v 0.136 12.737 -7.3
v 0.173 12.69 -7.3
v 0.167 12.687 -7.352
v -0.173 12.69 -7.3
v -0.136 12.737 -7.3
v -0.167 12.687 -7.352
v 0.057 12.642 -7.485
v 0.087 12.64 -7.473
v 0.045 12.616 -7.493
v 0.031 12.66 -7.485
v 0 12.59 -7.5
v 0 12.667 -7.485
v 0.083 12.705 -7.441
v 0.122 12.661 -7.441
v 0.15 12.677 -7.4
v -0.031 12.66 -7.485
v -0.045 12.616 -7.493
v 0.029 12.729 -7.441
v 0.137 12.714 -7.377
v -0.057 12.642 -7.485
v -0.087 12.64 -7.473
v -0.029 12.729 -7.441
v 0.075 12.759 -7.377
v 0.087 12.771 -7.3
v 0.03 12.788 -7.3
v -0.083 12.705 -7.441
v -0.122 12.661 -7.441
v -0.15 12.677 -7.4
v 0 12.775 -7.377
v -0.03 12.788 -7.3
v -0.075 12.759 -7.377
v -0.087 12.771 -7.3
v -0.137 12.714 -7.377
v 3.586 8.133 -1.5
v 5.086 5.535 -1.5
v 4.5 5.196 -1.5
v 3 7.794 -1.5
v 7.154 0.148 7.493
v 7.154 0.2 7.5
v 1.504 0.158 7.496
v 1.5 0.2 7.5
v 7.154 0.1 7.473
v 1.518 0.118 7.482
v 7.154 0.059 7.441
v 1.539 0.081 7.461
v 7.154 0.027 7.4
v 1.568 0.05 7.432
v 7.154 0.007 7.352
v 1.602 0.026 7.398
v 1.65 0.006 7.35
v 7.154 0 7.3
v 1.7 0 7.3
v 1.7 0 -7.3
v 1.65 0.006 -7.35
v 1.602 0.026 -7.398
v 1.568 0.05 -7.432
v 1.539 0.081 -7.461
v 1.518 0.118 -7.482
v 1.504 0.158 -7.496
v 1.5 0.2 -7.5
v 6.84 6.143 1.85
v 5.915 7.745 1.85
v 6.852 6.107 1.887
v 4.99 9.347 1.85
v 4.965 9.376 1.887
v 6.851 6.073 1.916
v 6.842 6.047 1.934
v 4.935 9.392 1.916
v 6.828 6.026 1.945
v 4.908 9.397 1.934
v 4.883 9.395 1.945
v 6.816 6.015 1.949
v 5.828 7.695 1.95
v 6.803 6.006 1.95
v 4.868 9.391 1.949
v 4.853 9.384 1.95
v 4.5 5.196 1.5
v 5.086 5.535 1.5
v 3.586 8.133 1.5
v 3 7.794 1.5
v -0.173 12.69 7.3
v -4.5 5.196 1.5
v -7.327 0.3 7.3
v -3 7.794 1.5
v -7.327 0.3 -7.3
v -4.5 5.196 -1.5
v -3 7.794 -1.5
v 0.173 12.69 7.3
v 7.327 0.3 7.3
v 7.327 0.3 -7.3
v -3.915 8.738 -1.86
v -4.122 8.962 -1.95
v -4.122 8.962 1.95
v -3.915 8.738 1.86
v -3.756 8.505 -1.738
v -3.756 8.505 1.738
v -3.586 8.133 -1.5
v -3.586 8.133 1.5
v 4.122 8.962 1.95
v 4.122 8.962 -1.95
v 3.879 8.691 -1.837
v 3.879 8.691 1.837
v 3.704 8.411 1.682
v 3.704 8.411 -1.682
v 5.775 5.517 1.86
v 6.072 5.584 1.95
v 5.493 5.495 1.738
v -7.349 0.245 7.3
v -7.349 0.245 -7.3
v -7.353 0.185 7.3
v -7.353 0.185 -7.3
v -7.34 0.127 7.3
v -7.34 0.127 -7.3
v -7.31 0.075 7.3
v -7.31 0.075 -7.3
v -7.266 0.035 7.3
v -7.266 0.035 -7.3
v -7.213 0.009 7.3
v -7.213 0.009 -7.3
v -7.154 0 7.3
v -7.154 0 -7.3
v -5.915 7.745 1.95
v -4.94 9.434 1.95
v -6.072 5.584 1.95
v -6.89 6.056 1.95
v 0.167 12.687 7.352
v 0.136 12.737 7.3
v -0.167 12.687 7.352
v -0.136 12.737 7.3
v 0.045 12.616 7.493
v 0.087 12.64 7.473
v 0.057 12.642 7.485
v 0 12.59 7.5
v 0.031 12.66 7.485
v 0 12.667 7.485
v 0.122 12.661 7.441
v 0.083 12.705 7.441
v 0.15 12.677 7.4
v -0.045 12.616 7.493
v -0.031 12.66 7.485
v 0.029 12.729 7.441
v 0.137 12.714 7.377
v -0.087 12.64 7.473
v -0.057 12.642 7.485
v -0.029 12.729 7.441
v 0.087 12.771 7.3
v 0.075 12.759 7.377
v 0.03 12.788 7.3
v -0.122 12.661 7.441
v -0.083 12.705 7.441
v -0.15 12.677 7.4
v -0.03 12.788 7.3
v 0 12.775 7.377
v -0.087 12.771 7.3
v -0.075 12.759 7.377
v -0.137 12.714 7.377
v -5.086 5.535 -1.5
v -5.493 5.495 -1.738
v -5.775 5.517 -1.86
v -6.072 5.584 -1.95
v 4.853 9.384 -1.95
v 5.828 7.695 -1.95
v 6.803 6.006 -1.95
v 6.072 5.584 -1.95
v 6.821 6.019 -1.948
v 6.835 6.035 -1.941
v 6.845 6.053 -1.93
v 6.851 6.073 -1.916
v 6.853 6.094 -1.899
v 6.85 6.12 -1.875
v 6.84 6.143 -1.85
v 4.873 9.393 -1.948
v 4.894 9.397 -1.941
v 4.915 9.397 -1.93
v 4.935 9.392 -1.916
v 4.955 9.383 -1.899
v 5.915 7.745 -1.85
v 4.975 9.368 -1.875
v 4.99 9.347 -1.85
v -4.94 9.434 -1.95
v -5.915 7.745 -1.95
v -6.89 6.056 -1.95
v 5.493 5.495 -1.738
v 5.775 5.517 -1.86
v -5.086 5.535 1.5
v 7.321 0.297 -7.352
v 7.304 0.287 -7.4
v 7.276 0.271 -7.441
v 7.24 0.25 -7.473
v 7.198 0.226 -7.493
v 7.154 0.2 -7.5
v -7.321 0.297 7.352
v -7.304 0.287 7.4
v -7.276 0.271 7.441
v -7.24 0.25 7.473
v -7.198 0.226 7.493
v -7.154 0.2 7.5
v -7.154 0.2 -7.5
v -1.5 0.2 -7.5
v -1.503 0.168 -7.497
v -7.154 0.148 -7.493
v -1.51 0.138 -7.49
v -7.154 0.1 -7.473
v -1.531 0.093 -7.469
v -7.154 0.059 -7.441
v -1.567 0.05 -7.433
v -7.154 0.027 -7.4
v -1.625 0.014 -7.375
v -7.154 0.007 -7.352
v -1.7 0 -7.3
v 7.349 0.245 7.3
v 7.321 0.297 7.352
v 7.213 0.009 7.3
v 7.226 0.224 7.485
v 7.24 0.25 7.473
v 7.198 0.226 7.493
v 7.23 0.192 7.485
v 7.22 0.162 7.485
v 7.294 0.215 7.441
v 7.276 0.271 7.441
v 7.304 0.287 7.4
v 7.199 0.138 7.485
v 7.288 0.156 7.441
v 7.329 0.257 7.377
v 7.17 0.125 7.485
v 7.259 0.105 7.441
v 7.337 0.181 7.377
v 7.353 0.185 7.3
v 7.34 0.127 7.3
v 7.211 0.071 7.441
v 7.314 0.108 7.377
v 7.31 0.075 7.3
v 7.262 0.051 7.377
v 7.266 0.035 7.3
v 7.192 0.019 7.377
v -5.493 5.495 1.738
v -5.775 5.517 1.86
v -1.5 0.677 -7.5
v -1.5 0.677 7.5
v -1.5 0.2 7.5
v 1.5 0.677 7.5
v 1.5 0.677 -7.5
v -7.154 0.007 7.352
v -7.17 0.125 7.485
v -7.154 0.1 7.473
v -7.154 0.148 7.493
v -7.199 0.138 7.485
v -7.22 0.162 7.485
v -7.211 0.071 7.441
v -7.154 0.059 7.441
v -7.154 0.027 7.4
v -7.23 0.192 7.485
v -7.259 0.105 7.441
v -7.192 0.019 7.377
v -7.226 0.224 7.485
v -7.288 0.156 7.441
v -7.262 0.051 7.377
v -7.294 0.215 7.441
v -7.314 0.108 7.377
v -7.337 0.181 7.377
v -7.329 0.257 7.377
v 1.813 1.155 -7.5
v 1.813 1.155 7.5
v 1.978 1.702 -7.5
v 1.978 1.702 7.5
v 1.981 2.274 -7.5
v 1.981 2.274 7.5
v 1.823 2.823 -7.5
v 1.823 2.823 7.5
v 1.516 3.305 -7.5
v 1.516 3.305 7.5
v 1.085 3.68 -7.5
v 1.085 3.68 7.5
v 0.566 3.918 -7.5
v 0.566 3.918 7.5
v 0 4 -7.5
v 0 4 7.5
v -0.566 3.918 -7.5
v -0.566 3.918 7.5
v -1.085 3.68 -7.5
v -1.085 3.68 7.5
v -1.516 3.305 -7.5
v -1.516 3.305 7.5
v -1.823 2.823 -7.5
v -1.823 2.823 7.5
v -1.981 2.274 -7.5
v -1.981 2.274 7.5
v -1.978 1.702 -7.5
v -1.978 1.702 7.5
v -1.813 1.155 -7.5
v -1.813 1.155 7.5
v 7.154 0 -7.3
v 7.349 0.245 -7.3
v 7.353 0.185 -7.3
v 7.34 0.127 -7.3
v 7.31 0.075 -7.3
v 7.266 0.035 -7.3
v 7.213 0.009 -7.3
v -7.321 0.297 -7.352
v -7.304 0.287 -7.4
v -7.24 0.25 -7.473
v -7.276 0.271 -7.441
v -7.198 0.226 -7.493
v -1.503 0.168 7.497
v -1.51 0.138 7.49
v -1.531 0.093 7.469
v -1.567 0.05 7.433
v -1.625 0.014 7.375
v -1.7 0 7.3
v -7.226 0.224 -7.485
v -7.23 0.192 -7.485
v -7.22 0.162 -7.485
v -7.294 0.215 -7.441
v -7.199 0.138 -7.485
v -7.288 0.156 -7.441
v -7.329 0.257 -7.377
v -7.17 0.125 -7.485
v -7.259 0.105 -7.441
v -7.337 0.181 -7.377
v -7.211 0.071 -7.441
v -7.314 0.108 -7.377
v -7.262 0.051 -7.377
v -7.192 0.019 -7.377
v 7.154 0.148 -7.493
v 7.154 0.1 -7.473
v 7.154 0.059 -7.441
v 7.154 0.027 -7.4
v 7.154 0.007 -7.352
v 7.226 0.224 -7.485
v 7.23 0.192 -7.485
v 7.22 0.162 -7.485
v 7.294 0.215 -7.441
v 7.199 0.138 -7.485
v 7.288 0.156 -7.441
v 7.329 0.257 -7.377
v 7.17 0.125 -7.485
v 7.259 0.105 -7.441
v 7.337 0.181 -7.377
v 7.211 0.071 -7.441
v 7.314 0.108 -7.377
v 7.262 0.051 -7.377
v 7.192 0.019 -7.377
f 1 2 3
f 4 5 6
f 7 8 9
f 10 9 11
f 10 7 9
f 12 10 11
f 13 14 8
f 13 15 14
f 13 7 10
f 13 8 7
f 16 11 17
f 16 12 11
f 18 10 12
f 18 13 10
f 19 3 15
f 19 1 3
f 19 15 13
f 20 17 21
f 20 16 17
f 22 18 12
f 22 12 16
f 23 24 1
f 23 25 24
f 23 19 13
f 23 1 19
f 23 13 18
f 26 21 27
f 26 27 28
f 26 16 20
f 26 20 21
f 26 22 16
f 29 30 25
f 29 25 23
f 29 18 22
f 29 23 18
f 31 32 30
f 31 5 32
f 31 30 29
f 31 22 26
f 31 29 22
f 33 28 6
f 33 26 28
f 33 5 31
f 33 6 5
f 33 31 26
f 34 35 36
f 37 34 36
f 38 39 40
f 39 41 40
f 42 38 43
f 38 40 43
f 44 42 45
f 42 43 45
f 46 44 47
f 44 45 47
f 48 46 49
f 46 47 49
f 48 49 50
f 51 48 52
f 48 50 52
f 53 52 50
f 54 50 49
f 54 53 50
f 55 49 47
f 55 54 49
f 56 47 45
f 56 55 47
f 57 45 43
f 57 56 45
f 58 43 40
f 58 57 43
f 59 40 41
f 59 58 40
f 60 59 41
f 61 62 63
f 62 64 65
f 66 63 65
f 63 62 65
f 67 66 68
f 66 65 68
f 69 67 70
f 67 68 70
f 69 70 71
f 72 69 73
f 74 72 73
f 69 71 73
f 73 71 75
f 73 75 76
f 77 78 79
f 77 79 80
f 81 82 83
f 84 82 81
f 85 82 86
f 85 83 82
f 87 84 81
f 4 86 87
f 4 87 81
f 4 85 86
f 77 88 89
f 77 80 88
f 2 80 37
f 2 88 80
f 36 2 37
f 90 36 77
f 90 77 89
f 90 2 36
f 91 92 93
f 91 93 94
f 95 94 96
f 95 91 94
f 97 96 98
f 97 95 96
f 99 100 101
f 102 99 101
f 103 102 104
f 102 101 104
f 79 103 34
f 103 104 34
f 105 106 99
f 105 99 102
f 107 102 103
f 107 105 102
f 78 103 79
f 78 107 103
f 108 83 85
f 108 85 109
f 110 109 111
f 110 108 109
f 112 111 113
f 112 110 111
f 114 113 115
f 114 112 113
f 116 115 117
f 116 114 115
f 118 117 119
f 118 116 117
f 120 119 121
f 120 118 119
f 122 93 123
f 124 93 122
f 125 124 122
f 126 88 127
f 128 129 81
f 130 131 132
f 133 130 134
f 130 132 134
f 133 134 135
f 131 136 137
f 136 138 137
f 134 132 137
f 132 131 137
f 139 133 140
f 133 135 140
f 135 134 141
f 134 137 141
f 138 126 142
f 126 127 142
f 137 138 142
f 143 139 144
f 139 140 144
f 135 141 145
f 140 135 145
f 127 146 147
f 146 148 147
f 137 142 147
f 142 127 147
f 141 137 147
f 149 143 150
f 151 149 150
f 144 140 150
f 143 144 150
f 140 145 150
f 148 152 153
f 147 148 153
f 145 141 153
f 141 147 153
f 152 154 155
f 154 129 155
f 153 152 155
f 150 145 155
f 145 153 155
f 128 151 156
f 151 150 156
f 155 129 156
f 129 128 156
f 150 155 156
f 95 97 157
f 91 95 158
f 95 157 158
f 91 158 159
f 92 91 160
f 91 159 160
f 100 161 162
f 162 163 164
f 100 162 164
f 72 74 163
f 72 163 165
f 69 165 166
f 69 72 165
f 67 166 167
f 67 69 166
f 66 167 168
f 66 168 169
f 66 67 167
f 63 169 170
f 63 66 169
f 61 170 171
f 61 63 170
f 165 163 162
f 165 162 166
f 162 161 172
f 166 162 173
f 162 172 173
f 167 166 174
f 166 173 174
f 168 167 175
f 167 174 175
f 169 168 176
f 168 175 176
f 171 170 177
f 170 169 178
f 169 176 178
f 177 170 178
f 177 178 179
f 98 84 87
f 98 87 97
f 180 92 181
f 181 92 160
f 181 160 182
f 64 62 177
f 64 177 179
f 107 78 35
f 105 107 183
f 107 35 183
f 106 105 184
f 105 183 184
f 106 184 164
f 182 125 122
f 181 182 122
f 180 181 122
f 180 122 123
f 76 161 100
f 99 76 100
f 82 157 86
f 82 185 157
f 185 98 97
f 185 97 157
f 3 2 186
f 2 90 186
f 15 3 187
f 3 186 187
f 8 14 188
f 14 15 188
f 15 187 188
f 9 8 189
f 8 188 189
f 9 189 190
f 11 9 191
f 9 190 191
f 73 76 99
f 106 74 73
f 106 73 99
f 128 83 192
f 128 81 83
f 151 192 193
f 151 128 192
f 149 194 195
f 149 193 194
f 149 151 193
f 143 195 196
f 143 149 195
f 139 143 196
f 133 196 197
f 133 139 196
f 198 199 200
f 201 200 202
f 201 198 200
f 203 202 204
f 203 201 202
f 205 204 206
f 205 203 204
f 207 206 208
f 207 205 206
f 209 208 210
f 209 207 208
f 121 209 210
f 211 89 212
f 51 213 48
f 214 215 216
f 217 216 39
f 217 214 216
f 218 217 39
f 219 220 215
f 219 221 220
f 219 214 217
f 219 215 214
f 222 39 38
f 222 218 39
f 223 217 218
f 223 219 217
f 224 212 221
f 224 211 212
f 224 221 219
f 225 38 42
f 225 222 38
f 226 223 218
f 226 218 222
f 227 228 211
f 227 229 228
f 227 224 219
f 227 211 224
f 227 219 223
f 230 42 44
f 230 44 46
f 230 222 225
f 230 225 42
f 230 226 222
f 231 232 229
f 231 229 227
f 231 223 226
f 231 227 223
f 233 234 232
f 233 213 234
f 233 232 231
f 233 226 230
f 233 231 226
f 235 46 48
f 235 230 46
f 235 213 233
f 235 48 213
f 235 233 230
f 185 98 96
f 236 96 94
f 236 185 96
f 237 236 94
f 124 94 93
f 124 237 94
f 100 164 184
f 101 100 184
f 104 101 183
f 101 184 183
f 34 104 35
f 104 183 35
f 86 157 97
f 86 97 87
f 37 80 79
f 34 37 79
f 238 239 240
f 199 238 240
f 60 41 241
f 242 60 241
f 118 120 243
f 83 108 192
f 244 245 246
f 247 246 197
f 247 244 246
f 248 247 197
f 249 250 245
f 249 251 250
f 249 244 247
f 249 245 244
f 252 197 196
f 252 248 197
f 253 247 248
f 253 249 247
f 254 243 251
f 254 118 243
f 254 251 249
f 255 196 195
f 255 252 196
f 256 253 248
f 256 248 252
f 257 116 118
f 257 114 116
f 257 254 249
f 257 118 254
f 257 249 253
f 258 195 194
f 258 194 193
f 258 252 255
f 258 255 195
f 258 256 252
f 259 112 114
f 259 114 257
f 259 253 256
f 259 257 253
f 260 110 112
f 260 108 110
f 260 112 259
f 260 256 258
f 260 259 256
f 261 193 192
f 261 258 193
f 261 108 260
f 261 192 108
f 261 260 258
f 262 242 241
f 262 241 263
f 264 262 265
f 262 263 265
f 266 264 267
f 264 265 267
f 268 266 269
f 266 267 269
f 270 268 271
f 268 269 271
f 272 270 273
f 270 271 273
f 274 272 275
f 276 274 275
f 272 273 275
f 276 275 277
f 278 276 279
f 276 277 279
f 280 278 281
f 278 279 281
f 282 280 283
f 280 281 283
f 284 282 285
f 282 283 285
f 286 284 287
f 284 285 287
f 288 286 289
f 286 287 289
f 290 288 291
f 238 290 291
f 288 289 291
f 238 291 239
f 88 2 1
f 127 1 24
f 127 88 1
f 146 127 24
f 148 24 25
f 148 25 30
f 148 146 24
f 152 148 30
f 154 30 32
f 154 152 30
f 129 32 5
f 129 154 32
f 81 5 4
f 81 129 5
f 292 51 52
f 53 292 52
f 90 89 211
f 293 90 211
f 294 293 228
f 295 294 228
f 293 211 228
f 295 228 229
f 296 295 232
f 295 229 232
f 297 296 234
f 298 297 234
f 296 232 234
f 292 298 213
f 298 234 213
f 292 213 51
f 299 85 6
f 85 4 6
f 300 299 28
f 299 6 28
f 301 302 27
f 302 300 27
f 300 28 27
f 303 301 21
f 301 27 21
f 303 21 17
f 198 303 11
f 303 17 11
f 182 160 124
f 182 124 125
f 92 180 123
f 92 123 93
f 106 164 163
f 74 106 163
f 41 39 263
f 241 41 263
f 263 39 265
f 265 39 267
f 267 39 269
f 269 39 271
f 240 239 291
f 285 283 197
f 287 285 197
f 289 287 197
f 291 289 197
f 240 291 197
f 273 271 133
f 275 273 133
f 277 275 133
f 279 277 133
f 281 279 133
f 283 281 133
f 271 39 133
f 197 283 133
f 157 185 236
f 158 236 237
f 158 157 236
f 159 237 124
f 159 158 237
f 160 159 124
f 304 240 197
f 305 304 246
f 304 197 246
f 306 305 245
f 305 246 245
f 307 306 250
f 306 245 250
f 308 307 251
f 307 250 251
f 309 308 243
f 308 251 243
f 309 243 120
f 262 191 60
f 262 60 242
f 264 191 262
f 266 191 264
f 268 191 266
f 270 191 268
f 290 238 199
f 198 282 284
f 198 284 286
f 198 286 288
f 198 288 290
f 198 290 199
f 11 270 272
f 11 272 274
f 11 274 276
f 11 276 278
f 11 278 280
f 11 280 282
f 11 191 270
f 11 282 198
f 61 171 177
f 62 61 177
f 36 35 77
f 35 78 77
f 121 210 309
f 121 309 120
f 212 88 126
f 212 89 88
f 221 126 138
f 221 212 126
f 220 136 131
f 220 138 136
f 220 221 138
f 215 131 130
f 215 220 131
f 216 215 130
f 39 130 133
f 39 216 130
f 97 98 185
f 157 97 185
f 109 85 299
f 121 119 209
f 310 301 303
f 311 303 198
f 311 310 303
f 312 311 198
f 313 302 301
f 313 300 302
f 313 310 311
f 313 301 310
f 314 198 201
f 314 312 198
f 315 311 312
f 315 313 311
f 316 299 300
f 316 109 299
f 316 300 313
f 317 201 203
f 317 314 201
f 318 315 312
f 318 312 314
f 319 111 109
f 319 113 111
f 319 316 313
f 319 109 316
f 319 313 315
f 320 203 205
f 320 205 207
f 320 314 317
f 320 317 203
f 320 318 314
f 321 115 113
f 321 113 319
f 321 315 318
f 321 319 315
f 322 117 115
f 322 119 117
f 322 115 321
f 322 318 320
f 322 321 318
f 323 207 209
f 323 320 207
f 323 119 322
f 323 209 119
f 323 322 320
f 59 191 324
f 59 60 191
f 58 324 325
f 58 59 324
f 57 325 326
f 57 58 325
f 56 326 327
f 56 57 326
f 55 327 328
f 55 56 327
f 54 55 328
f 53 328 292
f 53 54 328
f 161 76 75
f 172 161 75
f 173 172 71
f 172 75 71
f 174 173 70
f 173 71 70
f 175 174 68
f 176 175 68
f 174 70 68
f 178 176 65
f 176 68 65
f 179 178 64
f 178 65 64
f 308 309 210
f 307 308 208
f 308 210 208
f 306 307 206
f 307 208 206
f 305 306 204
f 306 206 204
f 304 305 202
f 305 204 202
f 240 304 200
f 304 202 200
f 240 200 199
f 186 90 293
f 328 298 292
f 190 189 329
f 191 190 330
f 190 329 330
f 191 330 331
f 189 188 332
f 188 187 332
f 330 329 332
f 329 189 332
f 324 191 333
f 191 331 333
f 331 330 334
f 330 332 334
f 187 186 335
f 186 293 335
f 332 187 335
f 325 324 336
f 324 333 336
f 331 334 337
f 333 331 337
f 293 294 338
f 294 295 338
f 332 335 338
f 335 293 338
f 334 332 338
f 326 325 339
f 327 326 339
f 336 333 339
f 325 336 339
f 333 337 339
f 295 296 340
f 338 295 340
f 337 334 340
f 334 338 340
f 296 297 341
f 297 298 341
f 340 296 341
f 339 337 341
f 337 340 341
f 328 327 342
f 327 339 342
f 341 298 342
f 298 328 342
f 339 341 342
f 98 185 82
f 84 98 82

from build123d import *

# Parameters (mm, degrees)
EXTRUDE_1_DEPTH        = 7.5
EXTRUDE_1_DEPTH_BACK   = 7.5
CUT_EXTRUDE_1_REACH    = 23.213
EXTRUDE_2_DEPTH        = 2
EXTRUDE_2_DEPTH_BACK   = 2
EXTRUDE_2_2_DEPTH      = 2
EXTRUDE_2_2_DEPTH_BACK = 2
EXTRUDE_4_DEPTH        = 1.5
CUT_EXTRUDE_2_DEPTH    = 17.046494944
FILLET_1_R             = 0.1
FILLET_2_R             = 0.2
CUT_EXTRUDE_3_REACH    = 17.828


with BuildPart() as part:
    # 草图1 → 凸台-拉伸1 (new, two sides: drawn at the far end of the back side and taken through both)
    with BuildSketch(Plane.XY.offset(-EXTRUDE_1_DEPTH_BACK)):
        Polygon((-7.5, 0), (0, 12.990381057), (7.5, 0), align=None)
    extrude(amount=EXTRUDE_1_DEPTH + EXTRUDE_1_DEPTH_BACK)

    # 草图2 → 切除-拉伸1 (cut, up to next)
    with BuildSketch(Plane.XY.offset(7.5), mode=Mode.PRIVATE) as cut_extrude_1_sk1:
        with BuildLine():
            Line((-1.5, 0.677124344), (-1.5, 0))
            Line((-1.5, 0), (1.5, 0))
            Line((1.5, 0), (1.5, 0.677124344))
            ThreePointArc((1.5, 0.677124344), (0, 4), (-1.5, 0.677124344))
        make_face()
    cut_extrude_1_tool1 = extrude(cut_extrude_1_sk1.sketch, amount=-CUT_EXTRUDE_1_REACH, mode=Mode.PRIVATE) & part.part
    add(cut_extrude_1_tool1.solids().sort_by_distance((0, 1.914707, 7.5))[0], mode=Mode.SUBTRACT)



with BuildPart() as body_2:
    # 草图3 → 凸台-拉伸2 (new, two sides: drawn at the far end of the back side and taken through both)
    with BuildSketch(Plane.XY.offset(-EXTRUDE_2_DEPTH_BACK)):
        with BuildLine():
            Line((3.586406884, 8.132790806), (5.086406884, 5.534714595))
            ThreePointArc((5.086406884, 5.534714595), (5.582396677, 5.497709438), (6.0721807, 5.584236131))
            Line((6.0721807, 5.584236131), (6.890063509, 6.056440991))
            Line((6.890063509, 6.056440991), (5.915063509, 7.745190528))
            Line((5.915063509, 7.745190528), (4.940063509, 9.433940066))
            Line((4.940063509, 9.433940066), (4.1221807, 8.961735205))
            ThreePointArc((4.1221807, 8.961735205), (3.802354375, 8.580833146), (3.586406884, 8.132790806))
        make_face()
    extrude(amount=EXTRUDE_2_DEPTH + EXTRUDE_2_DEPTH_BACK)


with BuildPart() as body_3:
    # 草图3 → Extrude 2 2 (new, two sides: drawn at the far end of the back side and taken through both)
    with BuildSketch(Plane.XY.offset(-EXTRUDE_2_2_DEPTH_BACK)):
        with BuildLine():
            Line((-4.940063509, 9.433940066), (-4.1221807, 8.961735205))
            ThreePointArc((-4.1221807, 8.961735205), (-3.802354375, 8.580833146), (-3.586406884, 8.132790806))
            Line((-3.586406884, 8.132790806), (-5.086406884, 5.534714595))
            ThreePointArc((-5.086406884, 5.534714595), (-5.582396677, 5.497709438), (-6.0721807, 5.584236131))
            Line((-6.0721807, 5.584236131), (-6.890063509, 6.056440991))
            Line((-6.890063509, 6.056440991), (-5.915063509, 7.745190528))
            Line((-5.915063509, 7.745190528), (-4.940063509, 9.433940066))
        make_face()
    extrude(amount=EXTRUDE_2_2_DEPTH + EXTRUDE_2_2_DEPTH_BACK)

    # 切除-拉伸3: up to this face of the body (flat: up to its plane)
    cut_extrude_3_end = Plane(body_3.part.faces().sort_by_distance((-4.531122105, 9.197837636, 0))[0])
    # 草图7 → 切除-拉伸3 (cut, up to the picked face)
    with BuildSketch(Plane(origin=(0.9, 1.558845727, 0), x_dir=(0.8660254037844376, -0.5000000000000019, 0), z_dir=(-0.5000000000000019, -0.8660254037844376, 0)), mode=Mode.PRIVATE) as cut_extrude_3_sk1:
        with BuildLine():
            Line((-8.995190528, 2), (-7.172314873, 2))
            Line((-7.172314873, 2), (-7.172314873, 1.5))
            ThreePointArc((-7.172314873, 1.5), (-7.583352056, 1.780042303), (-8.050780808, 1.95))
            Line((-8.050780808, 1.95), (-8.995190528, 1.95))
            Line((-8.995190528, 1.95), (-8.995190528, 2))
        make_face()
    cut_extrude_3_tool1 = split(extrude(cut_extrude_3_sk1.sketch, amount=-CUT_EXTRUDE_3_REACH, mode=Mode.PRIVATE), bisect_by=cut_extrude_3_end, keep=Keep.BOTH, mode=Mode.PRIVATE)
    # 草图7 → 切除-拉伸3 (cut, up to the picked face)
    with BuildSketch(Plane(origin=(0.9, 1.558845727, 0), x_dir=(0.8660254037844376, -0.5000000000000019, 0), z_dir=(-0.5000000000000019, -0.8660254037844376, 0)), mode=Mode.PRIVATE) as cut_extrude_3_sk2:
        with BuildLine():
            Line((-8.995190528, -2), (-7.172314873, -2))
            Line((-7.172314873, -2), (-7.172314873, -1.5))
            ThreePointArc((-7.172314873, -1.5), (-7.583352056, -1.780042303), (-8.050780808, -1.95))
            Line((-8.050780808, -1.95), (-8.995190528, -1.95))
            Line((-8.995190528, -1.95), (-8.995190528, -2))
        make_face()
    cut_extrude_3_tool2 = split(extrude(cut_extrude_3_sk2.sketch, amount=-CUT_EXTRUDE_3_REACH, mode=Mode.PRIVATE), bisect_by=cut_extrude_3_end, keep=Keep.BOTH, mode=Mode.PRIVATE)
    add(cut_extrude_3_tool1.solids().sort_by(Axis((-5.742645, 5.393979, 1.873038), (0.5000000000000019, 0.8660254037844376, 0)))[0], mode=Mode.SUBTRACT)
    add(cut_extrude_3_tool2.solids().sort_by(Axis((-5.742645, 5.393979, -1.873038), (0.5000000000000019, 0.8660254037844376, 0)))[0], mode=Mode.SUBTRACT)


with BuildPart() as part_1:
    add(part.part)

    add(body_2.part)  # 凸台-拉伸4 merges body 2
    # 草图5 → 凸台-拉伸4 (add, symmetric)
    with BuildSketch(Plane.XY):
        Polygon((3.586406884, 8.132790806), (5.086406884, 5.534714595), (4.5, 5.196152423), (3, 7.794228634), align=None)
    extrude_4 = extrude(amount=EXTRUDE_4_DEPTH, both=True)

    # 草图6 → 切除-拉伸2 (cut, through all)
    with BuildSketch(Plane(origin=(-0.9, 1.558845727, 0), x_dir=(0.8660254037844376, 0.5000000000000019, 0), z_dir=(0.5000000000000019, -0.8660254037844376, 0))):
        with BuildLine():
            Line((8.995190528, -2), (8.995190528, -1.95))
            Line((8.995190528, -1.95), (8.050780808, -1.95))
            ThreePointArc((8.050780808, -1.95), (7.583352056, -1.780042303), (7.172314873, -1.5))
            Line((7.172314873, -1.5), (7.172314873, -2))
            Line((7.172314873, -2), (8.995190528, -2))
        make_face()
        with BuildLine():
            Line((8.995190528, 1.95), (8.050780808, 1.95))
            ThreePointArc((8.050780808, 1.95), (7.583352056, 1.780042303), (7.172314873, 1.5))
            Line((7.172314873, 1.5), (7.172314873, 2))
            Line((7.172314873, 2), (8.995190528, 2))
            Line((8.995190528, 2), (8.995190528, 1.95))
        make_face()
    extrude(amount=-CUT_EXTRUDE_2_DEPTH, mode=Mode.SUBTRACT)

    # 圆角1
    fillet_1_edges = [part_1.edges().sort_by_distance(p)[0] for p in [
        (5.915063509, 7.745190528, 1.95),
        (6.890063509, 6.056440991, 0),
        (4.940063509, 9.433940066, 0),
        (5.915063509, 7.745190528, -1.95),
    ]]
    fillet(fillet_1_edges, radius=FILLET_1_R)

    # 圆角2
    fillet_2_edges = [part_1.edges().sort_by_distance(p)[0] for p in [
        (-3.75, 6.495190528, -7.5),
        (3.75, 6.495190528, 7.5),
        (-3.75, 6.495190528, 7.5),
        (4.5, 0, 7.5),
        (4.5, 0, -7.5),
        (1.5, 0, 0),
        (-1.5, 0, 0),
        (-4.5, 0, -7.5),
        (-7.5, 0, 0),
        (0, 12.990381057, 0),
        (7.5, 0, 0),
        (3.75, 6.495190528, -7.5),
        (-4.5, 0, 7.5),
    ]]
    fillet(fillet_2_edges, radius=FILLET_2_R)

    # 镜向9: 凸台-拉伸4 across plane
    add(extrude_4.mirror(Plane(origin=(0, 0, 0), x_dir=(0, 0, 1), z_dir=(1, 0, 0))))


solid = Compound([body_3.part, part_1.part])
